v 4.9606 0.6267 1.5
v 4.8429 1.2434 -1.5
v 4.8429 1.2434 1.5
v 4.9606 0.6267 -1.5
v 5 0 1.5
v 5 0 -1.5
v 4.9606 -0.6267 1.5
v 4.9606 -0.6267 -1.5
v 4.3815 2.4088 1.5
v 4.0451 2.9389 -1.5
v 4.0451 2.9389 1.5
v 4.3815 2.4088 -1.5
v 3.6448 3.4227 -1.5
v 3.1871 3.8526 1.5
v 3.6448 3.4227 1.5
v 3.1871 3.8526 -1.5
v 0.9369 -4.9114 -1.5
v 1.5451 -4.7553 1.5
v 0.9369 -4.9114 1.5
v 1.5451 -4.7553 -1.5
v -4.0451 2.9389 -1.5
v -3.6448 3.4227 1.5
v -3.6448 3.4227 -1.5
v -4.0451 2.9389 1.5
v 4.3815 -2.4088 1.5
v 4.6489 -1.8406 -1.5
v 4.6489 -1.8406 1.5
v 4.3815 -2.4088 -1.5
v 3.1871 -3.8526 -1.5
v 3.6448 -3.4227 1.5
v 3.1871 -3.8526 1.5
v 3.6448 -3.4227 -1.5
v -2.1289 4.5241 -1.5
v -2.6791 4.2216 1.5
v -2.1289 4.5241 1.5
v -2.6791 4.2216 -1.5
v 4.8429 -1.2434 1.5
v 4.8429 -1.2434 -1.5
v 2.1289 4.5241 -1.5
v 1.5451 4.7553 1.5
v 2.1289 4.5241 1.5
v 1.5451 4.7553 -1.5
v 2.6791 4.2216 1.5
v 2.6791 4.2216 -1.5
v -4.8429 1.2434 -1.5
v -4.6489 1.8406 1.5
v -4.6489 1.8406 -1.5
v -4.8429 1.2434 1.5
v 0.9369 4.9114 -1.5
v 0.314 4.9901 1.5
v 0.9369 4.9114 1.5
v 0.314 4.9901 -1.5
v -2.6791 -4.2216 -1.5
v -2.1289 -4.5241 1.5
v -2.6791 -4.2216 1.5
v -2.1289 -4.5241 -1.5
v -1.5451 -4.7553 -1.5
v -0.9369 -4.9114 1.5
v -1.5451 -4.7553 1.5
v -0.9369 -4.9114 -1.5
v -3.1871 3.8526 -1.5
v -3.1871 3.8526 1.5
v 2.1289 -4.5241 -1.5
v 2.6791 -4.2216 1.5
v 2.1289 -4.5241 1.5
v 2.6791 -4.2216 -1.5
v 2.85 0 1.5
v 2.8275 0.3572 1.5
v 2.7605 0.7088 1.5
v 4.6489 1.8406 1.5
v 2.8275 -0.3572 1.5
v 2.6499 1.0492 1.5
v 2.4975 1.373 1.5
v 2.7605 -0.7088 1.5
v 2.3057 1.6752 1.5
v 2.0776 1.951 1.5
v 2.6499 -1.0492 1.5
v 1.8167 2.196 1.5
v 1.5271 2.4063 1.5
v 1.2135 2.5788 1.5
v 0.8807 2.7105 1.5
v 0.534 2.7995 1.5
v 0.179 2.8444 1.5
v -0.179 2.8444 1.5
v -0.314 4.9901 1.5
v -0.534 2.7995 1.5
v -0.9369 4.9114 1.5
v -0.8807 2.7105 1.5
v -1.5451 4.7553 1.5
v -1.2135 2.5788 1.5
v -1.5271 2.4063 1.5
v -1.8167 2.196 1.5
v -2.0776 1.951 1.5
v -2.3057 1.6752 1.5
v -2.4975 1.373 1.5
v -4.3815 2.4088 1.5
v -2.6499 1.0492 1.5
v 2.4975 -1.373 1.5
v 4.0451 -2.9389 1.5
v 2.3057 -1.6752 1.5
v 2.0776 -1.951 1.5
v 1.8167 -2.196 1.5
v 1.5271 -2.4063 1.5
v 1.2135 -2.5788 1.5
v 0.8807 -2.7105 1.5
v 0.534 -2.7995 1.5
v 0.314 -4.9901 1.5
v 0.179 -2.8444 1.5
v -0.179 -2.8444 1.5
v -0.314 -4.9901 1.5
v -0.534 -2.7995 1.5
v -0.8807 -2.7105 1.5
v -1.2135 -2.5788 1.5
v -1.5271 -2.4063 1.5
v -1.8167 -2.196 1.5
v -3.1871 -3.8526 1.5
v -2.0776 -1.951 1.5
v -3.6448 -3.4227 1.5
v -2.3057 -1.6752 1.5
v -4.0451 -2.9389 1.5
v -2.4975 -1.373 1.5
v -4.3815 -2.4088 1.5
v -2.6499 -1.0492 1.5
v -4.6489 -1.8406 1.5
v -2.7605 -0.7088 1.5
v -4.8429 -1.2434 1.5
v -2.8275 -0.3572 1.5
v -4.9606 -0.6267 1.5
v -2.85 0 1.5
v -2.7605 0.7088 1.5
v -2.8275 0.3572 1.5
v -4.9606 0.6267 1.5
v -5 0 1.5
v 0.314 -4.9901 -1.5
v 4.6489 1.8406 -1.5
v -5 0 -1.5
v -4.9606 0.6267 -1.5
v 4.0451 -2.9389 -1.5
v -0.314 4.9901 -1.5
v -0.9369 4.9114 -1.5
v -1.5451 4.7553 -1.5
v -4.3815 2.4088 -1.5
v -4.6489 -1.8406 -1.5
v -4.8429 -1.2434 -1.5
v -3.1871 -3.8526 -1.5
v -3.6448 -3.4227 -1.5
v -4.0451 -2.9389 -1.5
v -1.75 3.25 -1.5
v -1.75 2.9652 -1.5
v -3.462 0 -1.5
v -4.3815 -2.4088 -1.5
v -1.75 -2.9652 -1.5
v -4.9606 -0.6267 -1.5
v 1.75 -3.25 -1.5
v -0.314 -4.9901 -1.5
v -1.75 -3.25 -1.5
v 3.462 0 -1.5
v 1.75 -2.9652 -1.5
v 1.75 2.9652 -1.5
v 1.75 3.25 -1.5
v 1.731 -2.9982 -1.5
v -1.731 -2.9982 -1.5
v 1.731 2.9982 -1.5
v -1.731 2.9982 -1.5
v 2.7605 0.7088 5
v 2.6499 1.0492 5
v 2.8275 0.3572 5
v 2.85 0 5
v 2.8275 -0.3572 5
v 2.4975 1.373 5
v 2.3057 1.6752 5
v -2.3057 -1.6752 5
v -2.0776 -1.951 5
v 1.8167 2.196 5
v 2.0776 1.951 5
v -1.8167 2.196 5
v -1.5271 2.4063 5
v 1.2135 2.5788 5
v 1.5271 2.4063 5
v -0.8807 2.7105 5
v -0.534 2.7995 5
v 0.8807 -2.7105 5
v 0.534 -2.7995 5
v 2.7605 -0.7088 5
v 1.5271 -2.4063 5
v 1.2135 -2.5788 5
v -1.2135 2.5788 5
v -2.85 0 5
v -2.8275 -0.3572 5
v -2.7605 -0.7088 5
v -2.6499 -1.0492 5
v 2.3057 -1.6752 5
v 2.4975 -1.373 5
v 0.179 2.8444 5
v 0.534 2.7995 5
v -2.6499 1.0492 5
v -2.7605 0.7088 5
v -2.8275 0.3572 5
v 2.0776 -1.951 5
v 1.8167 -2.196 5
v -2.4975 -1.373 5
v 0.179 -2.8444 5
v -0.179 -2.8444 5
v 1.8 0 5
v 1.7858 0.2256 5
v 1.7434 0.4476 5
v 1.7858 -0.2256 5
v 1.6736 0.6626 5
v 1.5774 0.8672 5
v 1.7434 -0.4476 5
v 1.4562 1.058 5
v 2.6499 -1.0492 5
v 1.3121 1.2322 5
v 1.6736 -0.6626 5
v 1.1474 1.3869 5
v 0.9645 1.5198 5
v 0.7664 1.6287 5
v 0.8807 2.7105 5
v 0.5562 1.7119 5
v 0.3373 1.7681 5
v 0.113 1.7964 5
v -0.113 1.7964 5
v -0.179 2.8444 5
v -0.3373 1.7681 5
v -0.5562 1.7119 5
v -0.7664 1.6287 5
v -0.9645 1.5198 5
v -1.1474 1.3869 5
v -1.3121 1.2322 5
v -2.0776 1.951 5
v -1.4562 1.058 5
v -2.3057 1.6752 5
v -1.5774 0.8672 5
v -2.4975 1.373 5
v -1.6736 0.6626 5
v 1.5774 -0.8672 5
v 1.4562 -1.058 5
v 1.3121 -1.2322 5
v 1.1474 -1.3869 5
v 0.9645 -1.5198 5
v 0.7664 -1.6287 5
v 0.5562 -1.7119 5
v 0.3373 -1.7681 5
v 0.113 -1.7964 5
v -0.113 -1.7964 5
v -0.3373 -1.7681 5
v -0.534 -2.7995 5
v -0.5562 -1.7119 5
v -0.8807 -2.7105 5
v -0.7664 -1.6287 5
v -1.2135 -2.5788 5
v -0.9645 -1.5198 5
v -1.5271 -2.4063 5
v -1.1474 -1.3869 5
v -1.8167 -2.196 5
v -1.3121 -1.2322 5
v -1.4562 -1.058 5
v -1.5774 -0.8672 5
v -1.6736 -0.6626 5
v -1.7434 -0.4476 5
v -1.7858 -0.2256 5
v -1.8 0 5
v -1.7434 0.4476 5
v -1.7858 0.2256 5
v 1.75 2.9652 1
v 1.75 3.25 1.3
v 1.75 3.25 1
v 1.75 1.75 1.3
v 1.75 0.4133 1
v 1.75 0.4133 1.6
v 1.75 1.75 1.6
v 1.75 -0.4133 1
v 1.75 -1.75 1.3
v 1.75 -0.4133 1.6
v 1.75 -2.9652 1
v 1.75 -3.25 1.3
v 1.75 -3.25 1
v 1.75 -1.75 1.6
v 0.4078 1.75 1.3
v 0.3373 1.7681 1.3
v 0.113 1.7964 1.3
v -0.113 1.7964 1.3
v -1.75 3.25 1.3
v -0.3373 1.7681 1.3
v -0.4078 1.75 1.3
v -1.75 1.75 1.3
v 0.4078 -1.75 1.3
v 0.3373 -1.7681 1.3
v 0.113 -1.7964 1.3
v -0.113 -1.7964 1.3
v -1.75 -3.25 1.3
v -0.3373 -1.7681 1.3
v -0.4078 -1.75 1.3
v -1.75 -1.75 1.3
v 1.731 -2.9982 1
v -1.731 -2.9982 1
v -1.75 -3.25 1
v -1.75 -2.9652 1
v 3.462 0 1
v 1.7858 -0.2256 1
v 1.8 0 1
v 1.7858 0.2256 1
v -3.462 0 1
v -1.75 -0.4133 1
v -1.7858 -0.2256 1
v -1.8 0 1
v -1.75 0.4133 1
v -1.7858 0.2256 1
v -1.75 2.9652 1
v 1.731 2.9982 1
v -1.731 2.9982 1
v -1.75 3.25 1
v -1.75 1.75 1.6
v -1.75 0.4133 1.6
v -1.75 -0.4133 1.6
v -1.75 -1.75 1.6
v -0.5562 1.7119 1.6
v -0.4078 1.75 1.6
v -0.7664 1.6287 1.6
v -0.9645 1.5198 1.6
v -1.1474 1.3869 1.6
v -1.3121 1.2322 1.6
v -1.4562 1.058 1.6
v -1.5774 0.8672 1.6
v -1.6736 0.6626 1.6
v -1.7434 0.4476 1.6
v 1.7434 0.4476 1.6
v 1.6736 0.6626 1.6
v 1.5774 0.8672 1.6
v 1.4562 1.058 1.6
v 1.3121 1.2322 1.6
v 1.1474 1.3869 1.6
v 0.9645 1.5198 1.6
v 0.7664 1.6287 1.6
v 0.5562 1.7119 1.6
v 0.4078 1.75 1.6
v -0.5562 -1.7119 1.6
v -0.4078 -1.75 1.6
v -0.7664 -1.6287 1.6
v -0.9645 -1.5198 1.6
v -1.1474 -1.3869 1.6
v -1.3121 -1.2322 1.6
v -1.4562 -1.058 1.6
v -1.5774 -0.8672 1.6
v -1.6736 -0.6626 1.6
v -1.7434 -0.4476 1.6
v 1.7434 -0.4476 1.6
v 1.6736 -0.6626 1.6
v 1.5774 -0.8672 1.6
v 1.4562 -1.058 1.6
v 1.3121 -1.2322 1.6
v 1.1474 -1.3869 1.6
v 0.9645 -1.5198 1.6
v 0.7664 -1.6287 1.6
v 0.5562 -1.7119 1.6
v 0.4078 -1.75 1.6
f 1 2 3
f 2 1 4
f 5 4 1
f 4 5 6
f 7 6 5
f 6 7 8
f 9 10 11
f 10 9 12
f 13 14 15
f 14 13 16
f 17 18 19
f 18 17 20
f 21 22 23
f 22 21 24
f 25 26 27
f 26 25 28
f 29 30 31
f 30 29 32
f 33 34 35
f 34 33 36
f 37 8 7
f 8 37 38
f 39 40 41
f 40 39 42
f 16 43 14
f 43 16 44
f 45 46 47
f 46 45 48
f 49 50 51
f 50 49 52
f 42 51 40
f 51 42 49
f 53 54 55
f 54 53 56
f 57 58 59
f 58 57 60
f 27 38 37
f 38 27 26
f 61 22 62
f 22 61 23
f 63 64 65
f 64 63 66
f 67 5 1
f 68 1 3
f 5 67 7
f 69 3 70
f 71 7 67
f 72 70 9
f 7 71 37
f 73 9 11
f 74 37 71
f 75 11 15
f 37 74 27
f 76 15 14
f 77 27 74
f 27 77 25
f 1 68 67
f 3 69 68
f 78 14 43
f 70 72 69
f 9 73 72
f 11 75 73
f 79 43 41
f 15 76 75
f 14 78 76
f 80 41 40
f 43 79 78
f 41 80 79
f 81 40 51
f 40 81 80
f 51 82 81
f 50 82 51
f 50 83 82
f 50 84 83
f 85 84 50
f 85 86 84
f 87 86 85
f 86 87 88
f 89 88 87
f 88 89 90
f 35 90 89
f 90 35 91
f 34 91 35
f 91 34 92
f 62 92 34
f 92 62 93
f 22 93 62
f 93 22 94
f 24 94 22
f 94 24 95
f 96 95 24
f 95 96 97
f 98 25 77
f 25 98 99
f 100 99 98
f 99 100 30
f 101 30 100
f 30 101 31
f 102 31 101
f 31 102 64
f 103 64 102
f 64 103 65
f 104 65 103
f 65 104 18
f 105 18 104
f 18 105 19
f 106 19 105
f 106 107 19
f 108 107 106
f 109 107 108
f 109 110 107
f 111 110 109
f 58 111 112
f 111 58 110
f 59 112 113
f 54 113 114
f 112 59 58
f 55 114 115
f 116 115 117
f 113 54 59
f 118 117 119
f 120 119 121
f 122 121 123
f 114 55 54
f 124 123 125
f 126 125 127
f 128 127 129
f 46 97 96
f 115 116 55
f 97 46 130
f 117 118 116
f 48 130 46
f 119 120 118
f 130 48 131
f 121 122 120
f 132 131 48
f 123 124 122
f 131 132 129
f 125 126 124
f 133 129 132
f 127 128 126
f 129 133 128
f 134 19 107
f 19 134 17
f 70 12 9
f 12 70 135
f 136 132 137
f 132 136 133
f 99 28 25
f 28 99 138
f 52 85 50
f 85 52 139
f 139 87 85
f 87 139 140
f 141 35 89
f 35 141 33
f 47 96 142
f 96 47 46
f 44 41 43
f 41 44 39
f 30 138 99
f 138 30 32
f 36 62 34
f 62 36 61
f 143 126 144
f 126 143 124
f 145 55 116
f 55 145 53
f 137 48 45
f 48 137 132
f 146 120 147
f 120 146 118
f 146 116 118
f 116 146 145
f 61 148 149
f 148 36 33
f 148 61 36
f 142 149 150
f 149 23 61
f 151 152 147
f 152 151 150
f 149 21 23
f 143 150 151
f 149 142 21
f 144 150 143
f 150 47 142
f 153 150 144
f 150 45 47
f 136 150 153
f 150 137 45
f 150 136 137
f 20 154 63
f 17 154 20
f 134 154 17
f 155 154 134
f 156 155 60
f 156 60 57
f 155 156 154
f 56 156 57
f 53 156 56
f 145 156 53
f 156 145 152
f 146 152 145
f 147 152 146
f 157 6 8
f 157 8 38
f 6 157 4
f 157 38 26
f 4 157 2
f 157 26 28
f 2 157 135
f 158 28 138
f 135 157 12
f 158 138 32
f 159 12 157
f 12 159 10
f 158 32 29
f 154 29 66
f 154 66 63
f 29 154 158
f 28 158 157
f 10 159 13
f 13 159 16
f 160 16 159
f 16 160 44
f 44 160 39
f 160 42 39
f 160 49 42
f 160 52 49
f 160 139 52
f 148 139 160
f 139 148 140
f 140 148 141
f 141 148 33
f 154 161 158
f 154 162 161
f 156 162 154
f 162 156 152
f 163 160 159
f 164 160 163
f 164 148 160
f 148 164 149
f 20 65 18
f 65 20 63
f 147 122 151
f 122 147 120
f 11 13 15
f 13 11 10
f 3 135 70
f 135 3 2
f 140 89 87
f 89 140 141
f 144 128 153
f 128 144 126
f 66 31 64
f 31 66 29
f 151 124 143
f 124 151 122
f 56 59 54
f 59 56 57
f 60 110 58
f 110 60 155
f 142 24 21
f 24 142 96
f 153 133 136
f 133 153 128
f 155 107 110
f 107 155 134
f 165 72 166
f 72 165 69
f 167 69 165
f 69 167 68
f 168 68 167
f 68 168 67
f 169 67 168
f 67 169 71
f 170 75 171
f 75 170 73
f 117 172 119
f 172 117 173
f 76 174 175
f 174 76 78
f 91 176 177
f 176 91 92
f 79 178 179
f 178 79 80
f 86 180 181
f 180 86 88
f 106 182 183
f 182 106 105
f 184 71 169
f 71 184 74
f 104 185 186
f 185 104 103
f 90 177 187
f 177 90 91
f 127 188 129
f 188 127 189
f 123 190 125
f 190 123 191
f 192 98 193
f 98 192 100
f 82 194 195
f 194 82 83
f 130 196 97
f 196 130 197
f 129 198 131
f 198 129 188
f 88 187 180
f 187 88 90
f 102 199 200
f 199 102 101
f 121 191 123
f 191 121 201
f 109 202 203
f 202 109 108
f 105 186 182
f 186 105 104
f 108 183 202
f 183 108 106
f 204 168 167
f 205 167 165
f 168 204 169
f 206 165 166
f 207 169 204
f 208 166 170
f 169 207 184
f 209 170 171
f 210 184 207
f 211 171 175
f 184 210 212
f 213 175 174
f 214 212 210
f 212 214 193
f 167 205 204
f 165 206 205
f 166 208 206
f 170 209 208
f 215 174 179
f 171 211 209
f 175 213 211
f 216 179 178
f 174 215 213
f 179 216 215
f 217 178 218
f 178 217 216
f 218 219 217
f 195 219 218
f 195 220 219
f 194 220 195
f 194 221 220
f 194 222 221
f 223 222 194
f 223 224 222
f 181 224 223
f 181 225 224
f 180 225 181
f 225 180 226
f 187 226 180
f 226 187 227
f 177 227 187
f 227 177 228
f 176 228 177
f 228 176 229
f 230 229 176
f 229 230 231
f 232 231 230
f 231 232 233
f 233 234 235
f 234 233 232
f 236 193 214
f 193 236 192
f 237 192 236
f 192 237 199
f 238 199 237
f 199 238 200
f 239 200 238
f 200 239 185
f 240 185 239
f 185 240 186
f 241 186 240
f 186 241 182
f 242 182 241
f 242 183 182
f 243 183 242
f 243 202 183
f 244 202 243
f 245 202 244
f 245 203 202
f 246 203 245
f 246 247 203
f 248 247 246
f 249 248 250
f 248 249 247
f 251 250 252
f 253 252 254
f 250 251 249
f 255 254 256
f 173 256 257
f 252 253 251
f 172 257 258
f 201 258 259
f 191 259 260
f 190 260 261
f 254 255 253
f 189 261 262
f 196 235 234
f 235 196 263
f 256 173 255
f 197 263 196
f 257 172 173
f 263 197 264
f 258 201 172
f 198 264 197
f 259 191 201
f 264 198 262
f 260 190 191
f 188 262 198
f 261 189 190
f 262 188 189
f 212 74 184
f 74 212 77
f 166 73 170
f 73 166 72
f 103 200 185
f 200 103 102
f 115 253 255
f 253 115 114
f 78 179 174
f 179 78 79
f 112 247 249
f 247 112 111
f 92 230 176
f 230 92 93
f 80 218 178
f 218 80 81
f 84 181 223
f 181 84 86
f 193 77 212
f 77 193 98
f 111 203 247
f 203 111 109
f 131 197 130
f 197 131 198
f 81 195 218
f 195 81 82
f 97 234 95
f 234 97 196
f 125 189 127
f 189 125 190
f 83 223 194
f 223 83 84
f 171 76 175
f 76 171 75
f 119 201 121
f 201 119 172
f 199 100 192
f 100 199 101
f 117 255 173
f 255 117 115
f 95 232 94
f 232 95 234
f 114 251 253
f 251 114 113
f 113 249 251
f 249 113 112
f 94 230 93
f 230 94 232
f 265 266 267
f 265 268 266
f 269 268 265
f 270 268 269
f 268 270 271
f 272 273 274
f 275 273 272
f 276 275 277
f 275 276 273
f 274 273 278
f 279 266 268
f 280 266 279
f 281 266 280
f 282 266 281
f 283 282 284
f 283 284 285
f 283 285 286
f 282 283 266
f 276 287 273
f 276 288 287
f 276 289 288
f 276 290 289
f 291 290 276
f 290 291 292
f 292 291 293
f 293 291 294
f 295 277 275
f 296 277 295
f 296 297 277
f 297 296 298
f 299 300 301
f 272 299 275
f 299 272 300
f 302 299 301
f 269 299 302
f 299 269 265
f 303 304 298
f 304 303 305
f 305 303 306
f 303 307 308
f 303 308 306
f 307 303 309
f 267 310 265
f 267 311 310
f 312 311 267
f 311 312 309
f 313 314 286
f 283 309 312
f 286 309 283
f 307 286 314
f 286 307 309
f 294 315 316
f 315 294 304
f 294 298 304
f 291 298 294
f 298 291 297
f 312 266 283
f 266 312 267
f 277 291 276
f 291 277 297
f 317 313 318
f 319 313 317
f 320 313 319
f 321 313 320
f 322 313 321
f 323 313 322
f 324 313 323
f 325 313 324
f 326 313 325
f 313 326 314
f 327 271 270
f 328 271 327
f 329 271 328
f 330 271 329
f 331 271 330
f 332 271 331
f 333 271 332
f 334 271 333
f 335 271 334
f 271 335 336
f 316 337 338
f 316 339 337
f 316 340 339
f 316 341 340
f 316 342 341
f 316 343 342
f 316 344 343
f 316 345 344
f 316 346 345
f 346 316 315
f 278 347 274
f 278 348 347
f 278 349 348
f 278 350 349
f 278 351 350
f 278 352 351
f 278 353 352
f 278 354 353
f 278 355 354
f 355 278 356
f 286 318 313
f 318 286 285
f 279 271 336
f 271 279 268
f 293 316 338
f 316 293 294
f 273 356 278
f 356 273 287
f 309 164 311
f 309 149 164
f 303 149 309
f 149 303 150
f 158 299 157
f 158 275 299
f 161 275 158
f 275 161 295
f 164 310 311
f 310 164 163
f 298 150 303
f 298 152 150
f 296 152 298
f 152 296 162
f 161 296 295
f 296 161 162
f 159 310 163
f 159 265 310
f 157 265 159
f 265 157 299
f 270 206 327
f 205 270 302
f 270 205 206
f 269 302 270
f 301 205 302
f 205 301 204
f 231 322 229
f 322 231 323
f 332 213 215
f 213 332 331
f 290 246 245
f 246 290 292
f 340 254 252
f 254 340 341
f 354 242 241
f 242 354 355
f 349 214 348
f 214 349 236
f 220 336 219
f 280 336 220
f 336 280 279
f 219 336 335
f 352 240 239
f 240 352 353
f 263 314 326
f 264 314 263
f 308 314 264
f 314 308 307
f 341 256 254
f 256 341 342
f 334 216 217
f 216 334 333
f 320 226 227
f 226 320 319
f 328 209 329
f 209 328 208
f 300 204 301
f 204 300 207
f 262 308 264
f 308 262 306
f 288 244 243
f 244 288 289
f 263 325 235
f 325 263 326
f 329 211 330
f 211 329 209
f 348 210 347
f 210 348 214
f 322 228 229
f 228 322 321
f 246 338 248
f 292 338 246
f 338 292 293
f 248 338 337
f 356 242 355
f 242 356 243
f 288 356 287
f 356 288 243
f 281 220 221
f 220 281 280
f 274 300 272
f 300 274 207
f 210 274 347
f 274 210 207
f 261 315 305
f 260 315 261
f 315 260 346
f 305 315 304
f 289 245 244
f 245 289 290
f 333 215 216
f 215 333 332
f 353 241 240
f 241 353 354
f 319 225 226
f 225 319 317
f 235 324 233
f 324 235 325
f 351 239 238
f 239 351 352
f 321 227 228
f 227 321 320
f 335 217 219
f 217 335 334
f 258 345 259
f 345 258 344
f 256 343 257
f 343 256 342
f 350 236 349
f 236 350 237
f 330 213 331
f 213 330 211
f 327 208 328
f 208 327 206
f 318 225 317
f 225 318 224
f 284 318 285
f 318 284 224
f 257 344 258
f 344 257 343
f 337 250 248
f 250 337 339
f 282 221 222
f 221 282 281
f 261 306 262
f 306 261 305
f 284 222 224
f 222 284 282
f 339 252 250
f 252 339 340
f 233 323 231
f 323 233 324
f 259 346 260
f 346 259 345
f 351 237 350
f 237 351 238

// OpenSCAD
$fn = 50;


difference() {
	union() {
		translate(v = [0, 0, -1.5000000000]) {
			cylinder(h = 3, r = 5.0000000000);
		}
		translate(v = [0, 0, -1.5000000000]) {
			cylinder(h = 6.5000000000, r = 2.8500000000);
		}
	}
	union() {
		translate(v = [0, 0, -1.5000000000]) {
			rotate(a = [0, 0, 0]) {
				difference() {
					union() {
						translate(v = [-1.7500000000, -3.2500000000, -0.3000000000]) {
							cube(size = [3.5000000000, 6.5000000000, 0.3000000000]);
						}
						translate(v = [-1.7500000000, -1.7500000000, -0.6000000000]) {
							cube(size = [3.5000000000, 3.5000000000, 0.3000000000]);
						}
						translate(v = [-1.7500000000, -3.2500000000, 2.5000000000]) {
							cube(size = [3.5000000000, 6.5000000000, 0.3000000000]);
						}
						translate(v = [-1.7500000000, -1.7500000000, 2.8000000000]) {
							cube(size = [3.5000000000, 3.5000000000, 0.3000000000]);
						}
						linear_extrude(height = 2.5000000000) {
							polygon(points = [[3.4620000000, 0.0000000000], [1.7310000000, 2.9981799479], [-1.7310000000, 2.9981799479], [-3.4620000000, 0.0000000000], [-1.7310000000, -2.9981799479], [1.7310000000, -2.9981799479]]);
						}
						translate(v = [-1.7500000000, -3.2500000000, -0.3000000000]) {
							cube(size = [3.5000000000, 6.5000000000, 0.3000000000]);
						}
						translate(v = [-1.7500000000, -1.7500000000, -0.6000000000]) {
							cube(size = [3.5000000000, 3.5000000000, 0.3000000000]);
						}
						translate(v = [-1.7500000000, -3.2500000000, 2.5000000000]) {
							cube(size = [3.5000000000, 6.5000000000, 0.3000000000]);
						}
						translate(v = [-1.7500000000, -1.7500000000, 2.8000000000]) {
							cube(size = [3.5000000000, 3.5000000000, 0.3000000000]);
						}
						translate(v = [-1.7500000000, -3.2500000000, -0.3000000000]) {
							cube(size = [3.5000000000, 6.5000000000, 0.3000000000]);
						}
						translate(v = [-1.7500000000, -1.7500000000, -0.6000000000]) {
							cube(size = [3.5000000000, 3.5000000000, 0.3000000000]);
						}
						translate(v = [-1.7500000000, -3.2500000000, 2.5000000000]) {
							cube(size = [3.5000000000, 6.5000000000, 0.3000000000]);
						}
						translate(v = [-1.7500000000, -1.7500000000, 2.8000000000]) {
							cube(size = [3.5000000000, 3.5000000000, 0.3000000000]);
						}
					}
					union();
				}
			}
		}
		translate(v = [0, 0, -100.0000000000]) {
			cylinder(h = 200, r = 1.8000000000);
		}
	}
}
